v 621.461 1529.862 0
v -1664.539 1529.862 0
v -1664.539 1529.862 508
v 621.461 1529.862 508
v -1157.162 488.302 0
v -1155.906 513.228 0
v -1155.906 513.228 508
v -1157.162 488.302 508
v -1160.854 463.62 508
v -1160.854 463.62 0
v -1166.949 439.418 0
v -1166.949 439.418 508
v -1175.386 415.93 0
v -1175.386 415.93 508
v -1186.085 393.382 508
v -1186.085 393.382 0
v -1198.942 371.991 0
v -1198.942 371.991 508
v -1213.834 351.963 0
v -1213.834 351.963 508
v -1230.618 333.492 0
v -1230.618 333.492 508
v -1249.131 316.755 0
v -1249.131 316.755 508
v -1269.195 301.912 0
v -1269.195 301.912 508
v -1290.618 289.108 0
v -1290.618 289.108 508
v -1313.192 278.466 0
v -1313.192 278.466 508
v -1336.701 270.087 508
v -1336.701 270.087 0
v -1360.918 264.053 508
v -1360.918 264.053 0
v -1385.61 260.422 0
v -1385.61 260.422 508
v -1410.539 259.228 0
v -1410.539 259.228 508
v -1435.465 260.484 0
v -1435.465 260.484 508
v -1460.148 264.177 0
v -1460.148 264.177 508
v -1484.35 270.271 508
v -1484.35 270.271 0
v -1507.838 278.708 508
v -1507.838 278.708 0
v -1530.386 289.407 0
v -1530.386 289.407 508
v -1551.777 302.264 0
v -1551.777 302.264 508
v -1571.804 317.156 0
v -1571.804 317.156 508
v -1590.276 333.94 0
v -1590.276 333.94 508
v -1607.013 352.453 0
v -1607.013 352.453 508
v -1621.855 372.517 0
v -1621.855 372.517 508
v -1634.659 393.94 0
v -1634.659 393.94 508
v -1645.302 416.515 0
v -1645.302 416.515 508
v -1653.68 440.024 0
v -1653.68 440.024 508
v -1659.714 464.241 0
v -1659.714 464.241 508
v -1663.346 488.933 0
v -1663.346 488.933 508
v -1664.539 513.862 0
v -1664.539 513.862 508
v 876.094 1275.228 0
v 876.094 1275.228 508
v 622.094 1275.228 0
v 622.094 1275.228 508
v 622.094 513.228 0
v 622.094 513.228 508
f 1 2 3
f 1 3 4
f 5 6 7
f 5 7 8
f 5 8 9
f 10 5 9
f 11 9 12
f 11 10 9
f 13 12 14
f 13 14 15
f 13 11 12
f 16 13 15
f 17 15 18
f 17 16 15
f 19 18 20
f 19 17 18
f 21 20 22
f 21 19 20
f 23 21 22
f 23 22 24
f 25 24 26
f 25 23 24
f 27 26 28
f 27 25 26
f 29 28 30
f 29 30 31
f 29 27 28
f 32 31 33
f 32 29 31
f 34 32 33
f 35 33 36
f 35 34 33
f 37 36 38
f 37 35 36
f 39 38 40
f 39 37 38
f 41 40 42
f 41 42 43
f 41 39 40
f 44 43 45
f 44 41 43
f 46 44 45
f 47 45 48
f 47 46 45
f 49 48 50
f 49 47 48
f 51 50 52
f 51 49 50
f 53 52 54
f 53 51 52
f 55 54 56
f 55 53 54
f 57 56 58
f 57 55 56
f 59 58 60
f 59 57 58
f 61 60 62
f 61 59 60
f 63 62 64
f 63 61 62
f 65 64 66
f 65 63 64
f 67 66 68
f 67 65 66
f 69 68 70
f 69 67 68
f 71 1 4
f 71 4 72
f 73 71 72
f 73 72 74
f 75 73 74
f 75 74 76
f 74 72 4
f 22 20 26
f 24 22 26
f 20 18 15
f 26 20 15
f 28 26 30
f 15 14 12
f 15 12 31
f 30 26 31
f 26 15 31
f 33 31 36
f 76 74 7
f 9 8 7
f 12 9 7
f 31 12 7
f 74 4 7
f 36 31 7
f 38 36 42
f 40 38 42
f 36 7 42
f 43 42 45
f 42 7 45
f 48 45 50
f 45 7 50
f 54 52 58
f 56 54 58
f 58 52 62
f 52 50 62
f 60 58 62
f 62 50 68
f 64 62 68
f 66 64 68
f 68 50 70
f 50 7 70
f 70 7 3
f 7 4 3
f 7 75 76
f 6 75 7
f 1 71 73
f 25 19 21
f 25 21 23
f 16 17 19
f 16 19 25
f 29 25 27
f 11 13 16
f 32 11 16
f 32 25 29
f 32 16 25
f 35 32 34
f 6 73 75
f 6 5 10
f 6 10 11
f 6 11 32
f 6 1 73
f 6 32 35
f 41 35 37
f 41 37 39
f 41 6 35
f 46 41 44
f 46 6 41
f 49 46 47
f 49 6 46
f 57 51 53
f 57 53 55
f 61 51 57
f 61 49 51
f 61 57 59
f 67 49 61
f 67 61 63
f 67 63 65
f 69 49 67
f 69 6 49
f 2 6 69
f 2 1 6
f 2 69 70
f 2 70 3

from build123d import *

# Parameters (mm, degrees)
BOSS_EXTRUDE1_DEPTH = 508


with BuildPart() as part:
    # Sketch1 → Boss-Extrude1 (new body)
    with BuildSketch(Plane.XY):
        with BuildLine():
            Line((-1664.53924545, 1529.861538462), (621.46075455, 1529.861538462))
            Line((621.46075455, 1529.861538462), (876.093987038, 1275.228305974))
            Line((876.093987038, 1275.228305974), (622.093987038, 1275.228305974))
            Line((622.093987038, 1275.228305974), (622.093987038, 513.228305974))
            Line((622.093987038, 513.228305974), (-1155.906012962, 513.228305974))
            ThreePointArc((-1155.906012962, 513.228305974), (-1410.53924545, 259.228305974), (-1664.53924545, 513.861538462))
            Line((-1664.53924545, 513.861538462), (-1664.53924545, 1529.861538462))
        make_face()
    extrude(amount=BOSS_EXTRUDE1_DEPTH)


solid = part.part
